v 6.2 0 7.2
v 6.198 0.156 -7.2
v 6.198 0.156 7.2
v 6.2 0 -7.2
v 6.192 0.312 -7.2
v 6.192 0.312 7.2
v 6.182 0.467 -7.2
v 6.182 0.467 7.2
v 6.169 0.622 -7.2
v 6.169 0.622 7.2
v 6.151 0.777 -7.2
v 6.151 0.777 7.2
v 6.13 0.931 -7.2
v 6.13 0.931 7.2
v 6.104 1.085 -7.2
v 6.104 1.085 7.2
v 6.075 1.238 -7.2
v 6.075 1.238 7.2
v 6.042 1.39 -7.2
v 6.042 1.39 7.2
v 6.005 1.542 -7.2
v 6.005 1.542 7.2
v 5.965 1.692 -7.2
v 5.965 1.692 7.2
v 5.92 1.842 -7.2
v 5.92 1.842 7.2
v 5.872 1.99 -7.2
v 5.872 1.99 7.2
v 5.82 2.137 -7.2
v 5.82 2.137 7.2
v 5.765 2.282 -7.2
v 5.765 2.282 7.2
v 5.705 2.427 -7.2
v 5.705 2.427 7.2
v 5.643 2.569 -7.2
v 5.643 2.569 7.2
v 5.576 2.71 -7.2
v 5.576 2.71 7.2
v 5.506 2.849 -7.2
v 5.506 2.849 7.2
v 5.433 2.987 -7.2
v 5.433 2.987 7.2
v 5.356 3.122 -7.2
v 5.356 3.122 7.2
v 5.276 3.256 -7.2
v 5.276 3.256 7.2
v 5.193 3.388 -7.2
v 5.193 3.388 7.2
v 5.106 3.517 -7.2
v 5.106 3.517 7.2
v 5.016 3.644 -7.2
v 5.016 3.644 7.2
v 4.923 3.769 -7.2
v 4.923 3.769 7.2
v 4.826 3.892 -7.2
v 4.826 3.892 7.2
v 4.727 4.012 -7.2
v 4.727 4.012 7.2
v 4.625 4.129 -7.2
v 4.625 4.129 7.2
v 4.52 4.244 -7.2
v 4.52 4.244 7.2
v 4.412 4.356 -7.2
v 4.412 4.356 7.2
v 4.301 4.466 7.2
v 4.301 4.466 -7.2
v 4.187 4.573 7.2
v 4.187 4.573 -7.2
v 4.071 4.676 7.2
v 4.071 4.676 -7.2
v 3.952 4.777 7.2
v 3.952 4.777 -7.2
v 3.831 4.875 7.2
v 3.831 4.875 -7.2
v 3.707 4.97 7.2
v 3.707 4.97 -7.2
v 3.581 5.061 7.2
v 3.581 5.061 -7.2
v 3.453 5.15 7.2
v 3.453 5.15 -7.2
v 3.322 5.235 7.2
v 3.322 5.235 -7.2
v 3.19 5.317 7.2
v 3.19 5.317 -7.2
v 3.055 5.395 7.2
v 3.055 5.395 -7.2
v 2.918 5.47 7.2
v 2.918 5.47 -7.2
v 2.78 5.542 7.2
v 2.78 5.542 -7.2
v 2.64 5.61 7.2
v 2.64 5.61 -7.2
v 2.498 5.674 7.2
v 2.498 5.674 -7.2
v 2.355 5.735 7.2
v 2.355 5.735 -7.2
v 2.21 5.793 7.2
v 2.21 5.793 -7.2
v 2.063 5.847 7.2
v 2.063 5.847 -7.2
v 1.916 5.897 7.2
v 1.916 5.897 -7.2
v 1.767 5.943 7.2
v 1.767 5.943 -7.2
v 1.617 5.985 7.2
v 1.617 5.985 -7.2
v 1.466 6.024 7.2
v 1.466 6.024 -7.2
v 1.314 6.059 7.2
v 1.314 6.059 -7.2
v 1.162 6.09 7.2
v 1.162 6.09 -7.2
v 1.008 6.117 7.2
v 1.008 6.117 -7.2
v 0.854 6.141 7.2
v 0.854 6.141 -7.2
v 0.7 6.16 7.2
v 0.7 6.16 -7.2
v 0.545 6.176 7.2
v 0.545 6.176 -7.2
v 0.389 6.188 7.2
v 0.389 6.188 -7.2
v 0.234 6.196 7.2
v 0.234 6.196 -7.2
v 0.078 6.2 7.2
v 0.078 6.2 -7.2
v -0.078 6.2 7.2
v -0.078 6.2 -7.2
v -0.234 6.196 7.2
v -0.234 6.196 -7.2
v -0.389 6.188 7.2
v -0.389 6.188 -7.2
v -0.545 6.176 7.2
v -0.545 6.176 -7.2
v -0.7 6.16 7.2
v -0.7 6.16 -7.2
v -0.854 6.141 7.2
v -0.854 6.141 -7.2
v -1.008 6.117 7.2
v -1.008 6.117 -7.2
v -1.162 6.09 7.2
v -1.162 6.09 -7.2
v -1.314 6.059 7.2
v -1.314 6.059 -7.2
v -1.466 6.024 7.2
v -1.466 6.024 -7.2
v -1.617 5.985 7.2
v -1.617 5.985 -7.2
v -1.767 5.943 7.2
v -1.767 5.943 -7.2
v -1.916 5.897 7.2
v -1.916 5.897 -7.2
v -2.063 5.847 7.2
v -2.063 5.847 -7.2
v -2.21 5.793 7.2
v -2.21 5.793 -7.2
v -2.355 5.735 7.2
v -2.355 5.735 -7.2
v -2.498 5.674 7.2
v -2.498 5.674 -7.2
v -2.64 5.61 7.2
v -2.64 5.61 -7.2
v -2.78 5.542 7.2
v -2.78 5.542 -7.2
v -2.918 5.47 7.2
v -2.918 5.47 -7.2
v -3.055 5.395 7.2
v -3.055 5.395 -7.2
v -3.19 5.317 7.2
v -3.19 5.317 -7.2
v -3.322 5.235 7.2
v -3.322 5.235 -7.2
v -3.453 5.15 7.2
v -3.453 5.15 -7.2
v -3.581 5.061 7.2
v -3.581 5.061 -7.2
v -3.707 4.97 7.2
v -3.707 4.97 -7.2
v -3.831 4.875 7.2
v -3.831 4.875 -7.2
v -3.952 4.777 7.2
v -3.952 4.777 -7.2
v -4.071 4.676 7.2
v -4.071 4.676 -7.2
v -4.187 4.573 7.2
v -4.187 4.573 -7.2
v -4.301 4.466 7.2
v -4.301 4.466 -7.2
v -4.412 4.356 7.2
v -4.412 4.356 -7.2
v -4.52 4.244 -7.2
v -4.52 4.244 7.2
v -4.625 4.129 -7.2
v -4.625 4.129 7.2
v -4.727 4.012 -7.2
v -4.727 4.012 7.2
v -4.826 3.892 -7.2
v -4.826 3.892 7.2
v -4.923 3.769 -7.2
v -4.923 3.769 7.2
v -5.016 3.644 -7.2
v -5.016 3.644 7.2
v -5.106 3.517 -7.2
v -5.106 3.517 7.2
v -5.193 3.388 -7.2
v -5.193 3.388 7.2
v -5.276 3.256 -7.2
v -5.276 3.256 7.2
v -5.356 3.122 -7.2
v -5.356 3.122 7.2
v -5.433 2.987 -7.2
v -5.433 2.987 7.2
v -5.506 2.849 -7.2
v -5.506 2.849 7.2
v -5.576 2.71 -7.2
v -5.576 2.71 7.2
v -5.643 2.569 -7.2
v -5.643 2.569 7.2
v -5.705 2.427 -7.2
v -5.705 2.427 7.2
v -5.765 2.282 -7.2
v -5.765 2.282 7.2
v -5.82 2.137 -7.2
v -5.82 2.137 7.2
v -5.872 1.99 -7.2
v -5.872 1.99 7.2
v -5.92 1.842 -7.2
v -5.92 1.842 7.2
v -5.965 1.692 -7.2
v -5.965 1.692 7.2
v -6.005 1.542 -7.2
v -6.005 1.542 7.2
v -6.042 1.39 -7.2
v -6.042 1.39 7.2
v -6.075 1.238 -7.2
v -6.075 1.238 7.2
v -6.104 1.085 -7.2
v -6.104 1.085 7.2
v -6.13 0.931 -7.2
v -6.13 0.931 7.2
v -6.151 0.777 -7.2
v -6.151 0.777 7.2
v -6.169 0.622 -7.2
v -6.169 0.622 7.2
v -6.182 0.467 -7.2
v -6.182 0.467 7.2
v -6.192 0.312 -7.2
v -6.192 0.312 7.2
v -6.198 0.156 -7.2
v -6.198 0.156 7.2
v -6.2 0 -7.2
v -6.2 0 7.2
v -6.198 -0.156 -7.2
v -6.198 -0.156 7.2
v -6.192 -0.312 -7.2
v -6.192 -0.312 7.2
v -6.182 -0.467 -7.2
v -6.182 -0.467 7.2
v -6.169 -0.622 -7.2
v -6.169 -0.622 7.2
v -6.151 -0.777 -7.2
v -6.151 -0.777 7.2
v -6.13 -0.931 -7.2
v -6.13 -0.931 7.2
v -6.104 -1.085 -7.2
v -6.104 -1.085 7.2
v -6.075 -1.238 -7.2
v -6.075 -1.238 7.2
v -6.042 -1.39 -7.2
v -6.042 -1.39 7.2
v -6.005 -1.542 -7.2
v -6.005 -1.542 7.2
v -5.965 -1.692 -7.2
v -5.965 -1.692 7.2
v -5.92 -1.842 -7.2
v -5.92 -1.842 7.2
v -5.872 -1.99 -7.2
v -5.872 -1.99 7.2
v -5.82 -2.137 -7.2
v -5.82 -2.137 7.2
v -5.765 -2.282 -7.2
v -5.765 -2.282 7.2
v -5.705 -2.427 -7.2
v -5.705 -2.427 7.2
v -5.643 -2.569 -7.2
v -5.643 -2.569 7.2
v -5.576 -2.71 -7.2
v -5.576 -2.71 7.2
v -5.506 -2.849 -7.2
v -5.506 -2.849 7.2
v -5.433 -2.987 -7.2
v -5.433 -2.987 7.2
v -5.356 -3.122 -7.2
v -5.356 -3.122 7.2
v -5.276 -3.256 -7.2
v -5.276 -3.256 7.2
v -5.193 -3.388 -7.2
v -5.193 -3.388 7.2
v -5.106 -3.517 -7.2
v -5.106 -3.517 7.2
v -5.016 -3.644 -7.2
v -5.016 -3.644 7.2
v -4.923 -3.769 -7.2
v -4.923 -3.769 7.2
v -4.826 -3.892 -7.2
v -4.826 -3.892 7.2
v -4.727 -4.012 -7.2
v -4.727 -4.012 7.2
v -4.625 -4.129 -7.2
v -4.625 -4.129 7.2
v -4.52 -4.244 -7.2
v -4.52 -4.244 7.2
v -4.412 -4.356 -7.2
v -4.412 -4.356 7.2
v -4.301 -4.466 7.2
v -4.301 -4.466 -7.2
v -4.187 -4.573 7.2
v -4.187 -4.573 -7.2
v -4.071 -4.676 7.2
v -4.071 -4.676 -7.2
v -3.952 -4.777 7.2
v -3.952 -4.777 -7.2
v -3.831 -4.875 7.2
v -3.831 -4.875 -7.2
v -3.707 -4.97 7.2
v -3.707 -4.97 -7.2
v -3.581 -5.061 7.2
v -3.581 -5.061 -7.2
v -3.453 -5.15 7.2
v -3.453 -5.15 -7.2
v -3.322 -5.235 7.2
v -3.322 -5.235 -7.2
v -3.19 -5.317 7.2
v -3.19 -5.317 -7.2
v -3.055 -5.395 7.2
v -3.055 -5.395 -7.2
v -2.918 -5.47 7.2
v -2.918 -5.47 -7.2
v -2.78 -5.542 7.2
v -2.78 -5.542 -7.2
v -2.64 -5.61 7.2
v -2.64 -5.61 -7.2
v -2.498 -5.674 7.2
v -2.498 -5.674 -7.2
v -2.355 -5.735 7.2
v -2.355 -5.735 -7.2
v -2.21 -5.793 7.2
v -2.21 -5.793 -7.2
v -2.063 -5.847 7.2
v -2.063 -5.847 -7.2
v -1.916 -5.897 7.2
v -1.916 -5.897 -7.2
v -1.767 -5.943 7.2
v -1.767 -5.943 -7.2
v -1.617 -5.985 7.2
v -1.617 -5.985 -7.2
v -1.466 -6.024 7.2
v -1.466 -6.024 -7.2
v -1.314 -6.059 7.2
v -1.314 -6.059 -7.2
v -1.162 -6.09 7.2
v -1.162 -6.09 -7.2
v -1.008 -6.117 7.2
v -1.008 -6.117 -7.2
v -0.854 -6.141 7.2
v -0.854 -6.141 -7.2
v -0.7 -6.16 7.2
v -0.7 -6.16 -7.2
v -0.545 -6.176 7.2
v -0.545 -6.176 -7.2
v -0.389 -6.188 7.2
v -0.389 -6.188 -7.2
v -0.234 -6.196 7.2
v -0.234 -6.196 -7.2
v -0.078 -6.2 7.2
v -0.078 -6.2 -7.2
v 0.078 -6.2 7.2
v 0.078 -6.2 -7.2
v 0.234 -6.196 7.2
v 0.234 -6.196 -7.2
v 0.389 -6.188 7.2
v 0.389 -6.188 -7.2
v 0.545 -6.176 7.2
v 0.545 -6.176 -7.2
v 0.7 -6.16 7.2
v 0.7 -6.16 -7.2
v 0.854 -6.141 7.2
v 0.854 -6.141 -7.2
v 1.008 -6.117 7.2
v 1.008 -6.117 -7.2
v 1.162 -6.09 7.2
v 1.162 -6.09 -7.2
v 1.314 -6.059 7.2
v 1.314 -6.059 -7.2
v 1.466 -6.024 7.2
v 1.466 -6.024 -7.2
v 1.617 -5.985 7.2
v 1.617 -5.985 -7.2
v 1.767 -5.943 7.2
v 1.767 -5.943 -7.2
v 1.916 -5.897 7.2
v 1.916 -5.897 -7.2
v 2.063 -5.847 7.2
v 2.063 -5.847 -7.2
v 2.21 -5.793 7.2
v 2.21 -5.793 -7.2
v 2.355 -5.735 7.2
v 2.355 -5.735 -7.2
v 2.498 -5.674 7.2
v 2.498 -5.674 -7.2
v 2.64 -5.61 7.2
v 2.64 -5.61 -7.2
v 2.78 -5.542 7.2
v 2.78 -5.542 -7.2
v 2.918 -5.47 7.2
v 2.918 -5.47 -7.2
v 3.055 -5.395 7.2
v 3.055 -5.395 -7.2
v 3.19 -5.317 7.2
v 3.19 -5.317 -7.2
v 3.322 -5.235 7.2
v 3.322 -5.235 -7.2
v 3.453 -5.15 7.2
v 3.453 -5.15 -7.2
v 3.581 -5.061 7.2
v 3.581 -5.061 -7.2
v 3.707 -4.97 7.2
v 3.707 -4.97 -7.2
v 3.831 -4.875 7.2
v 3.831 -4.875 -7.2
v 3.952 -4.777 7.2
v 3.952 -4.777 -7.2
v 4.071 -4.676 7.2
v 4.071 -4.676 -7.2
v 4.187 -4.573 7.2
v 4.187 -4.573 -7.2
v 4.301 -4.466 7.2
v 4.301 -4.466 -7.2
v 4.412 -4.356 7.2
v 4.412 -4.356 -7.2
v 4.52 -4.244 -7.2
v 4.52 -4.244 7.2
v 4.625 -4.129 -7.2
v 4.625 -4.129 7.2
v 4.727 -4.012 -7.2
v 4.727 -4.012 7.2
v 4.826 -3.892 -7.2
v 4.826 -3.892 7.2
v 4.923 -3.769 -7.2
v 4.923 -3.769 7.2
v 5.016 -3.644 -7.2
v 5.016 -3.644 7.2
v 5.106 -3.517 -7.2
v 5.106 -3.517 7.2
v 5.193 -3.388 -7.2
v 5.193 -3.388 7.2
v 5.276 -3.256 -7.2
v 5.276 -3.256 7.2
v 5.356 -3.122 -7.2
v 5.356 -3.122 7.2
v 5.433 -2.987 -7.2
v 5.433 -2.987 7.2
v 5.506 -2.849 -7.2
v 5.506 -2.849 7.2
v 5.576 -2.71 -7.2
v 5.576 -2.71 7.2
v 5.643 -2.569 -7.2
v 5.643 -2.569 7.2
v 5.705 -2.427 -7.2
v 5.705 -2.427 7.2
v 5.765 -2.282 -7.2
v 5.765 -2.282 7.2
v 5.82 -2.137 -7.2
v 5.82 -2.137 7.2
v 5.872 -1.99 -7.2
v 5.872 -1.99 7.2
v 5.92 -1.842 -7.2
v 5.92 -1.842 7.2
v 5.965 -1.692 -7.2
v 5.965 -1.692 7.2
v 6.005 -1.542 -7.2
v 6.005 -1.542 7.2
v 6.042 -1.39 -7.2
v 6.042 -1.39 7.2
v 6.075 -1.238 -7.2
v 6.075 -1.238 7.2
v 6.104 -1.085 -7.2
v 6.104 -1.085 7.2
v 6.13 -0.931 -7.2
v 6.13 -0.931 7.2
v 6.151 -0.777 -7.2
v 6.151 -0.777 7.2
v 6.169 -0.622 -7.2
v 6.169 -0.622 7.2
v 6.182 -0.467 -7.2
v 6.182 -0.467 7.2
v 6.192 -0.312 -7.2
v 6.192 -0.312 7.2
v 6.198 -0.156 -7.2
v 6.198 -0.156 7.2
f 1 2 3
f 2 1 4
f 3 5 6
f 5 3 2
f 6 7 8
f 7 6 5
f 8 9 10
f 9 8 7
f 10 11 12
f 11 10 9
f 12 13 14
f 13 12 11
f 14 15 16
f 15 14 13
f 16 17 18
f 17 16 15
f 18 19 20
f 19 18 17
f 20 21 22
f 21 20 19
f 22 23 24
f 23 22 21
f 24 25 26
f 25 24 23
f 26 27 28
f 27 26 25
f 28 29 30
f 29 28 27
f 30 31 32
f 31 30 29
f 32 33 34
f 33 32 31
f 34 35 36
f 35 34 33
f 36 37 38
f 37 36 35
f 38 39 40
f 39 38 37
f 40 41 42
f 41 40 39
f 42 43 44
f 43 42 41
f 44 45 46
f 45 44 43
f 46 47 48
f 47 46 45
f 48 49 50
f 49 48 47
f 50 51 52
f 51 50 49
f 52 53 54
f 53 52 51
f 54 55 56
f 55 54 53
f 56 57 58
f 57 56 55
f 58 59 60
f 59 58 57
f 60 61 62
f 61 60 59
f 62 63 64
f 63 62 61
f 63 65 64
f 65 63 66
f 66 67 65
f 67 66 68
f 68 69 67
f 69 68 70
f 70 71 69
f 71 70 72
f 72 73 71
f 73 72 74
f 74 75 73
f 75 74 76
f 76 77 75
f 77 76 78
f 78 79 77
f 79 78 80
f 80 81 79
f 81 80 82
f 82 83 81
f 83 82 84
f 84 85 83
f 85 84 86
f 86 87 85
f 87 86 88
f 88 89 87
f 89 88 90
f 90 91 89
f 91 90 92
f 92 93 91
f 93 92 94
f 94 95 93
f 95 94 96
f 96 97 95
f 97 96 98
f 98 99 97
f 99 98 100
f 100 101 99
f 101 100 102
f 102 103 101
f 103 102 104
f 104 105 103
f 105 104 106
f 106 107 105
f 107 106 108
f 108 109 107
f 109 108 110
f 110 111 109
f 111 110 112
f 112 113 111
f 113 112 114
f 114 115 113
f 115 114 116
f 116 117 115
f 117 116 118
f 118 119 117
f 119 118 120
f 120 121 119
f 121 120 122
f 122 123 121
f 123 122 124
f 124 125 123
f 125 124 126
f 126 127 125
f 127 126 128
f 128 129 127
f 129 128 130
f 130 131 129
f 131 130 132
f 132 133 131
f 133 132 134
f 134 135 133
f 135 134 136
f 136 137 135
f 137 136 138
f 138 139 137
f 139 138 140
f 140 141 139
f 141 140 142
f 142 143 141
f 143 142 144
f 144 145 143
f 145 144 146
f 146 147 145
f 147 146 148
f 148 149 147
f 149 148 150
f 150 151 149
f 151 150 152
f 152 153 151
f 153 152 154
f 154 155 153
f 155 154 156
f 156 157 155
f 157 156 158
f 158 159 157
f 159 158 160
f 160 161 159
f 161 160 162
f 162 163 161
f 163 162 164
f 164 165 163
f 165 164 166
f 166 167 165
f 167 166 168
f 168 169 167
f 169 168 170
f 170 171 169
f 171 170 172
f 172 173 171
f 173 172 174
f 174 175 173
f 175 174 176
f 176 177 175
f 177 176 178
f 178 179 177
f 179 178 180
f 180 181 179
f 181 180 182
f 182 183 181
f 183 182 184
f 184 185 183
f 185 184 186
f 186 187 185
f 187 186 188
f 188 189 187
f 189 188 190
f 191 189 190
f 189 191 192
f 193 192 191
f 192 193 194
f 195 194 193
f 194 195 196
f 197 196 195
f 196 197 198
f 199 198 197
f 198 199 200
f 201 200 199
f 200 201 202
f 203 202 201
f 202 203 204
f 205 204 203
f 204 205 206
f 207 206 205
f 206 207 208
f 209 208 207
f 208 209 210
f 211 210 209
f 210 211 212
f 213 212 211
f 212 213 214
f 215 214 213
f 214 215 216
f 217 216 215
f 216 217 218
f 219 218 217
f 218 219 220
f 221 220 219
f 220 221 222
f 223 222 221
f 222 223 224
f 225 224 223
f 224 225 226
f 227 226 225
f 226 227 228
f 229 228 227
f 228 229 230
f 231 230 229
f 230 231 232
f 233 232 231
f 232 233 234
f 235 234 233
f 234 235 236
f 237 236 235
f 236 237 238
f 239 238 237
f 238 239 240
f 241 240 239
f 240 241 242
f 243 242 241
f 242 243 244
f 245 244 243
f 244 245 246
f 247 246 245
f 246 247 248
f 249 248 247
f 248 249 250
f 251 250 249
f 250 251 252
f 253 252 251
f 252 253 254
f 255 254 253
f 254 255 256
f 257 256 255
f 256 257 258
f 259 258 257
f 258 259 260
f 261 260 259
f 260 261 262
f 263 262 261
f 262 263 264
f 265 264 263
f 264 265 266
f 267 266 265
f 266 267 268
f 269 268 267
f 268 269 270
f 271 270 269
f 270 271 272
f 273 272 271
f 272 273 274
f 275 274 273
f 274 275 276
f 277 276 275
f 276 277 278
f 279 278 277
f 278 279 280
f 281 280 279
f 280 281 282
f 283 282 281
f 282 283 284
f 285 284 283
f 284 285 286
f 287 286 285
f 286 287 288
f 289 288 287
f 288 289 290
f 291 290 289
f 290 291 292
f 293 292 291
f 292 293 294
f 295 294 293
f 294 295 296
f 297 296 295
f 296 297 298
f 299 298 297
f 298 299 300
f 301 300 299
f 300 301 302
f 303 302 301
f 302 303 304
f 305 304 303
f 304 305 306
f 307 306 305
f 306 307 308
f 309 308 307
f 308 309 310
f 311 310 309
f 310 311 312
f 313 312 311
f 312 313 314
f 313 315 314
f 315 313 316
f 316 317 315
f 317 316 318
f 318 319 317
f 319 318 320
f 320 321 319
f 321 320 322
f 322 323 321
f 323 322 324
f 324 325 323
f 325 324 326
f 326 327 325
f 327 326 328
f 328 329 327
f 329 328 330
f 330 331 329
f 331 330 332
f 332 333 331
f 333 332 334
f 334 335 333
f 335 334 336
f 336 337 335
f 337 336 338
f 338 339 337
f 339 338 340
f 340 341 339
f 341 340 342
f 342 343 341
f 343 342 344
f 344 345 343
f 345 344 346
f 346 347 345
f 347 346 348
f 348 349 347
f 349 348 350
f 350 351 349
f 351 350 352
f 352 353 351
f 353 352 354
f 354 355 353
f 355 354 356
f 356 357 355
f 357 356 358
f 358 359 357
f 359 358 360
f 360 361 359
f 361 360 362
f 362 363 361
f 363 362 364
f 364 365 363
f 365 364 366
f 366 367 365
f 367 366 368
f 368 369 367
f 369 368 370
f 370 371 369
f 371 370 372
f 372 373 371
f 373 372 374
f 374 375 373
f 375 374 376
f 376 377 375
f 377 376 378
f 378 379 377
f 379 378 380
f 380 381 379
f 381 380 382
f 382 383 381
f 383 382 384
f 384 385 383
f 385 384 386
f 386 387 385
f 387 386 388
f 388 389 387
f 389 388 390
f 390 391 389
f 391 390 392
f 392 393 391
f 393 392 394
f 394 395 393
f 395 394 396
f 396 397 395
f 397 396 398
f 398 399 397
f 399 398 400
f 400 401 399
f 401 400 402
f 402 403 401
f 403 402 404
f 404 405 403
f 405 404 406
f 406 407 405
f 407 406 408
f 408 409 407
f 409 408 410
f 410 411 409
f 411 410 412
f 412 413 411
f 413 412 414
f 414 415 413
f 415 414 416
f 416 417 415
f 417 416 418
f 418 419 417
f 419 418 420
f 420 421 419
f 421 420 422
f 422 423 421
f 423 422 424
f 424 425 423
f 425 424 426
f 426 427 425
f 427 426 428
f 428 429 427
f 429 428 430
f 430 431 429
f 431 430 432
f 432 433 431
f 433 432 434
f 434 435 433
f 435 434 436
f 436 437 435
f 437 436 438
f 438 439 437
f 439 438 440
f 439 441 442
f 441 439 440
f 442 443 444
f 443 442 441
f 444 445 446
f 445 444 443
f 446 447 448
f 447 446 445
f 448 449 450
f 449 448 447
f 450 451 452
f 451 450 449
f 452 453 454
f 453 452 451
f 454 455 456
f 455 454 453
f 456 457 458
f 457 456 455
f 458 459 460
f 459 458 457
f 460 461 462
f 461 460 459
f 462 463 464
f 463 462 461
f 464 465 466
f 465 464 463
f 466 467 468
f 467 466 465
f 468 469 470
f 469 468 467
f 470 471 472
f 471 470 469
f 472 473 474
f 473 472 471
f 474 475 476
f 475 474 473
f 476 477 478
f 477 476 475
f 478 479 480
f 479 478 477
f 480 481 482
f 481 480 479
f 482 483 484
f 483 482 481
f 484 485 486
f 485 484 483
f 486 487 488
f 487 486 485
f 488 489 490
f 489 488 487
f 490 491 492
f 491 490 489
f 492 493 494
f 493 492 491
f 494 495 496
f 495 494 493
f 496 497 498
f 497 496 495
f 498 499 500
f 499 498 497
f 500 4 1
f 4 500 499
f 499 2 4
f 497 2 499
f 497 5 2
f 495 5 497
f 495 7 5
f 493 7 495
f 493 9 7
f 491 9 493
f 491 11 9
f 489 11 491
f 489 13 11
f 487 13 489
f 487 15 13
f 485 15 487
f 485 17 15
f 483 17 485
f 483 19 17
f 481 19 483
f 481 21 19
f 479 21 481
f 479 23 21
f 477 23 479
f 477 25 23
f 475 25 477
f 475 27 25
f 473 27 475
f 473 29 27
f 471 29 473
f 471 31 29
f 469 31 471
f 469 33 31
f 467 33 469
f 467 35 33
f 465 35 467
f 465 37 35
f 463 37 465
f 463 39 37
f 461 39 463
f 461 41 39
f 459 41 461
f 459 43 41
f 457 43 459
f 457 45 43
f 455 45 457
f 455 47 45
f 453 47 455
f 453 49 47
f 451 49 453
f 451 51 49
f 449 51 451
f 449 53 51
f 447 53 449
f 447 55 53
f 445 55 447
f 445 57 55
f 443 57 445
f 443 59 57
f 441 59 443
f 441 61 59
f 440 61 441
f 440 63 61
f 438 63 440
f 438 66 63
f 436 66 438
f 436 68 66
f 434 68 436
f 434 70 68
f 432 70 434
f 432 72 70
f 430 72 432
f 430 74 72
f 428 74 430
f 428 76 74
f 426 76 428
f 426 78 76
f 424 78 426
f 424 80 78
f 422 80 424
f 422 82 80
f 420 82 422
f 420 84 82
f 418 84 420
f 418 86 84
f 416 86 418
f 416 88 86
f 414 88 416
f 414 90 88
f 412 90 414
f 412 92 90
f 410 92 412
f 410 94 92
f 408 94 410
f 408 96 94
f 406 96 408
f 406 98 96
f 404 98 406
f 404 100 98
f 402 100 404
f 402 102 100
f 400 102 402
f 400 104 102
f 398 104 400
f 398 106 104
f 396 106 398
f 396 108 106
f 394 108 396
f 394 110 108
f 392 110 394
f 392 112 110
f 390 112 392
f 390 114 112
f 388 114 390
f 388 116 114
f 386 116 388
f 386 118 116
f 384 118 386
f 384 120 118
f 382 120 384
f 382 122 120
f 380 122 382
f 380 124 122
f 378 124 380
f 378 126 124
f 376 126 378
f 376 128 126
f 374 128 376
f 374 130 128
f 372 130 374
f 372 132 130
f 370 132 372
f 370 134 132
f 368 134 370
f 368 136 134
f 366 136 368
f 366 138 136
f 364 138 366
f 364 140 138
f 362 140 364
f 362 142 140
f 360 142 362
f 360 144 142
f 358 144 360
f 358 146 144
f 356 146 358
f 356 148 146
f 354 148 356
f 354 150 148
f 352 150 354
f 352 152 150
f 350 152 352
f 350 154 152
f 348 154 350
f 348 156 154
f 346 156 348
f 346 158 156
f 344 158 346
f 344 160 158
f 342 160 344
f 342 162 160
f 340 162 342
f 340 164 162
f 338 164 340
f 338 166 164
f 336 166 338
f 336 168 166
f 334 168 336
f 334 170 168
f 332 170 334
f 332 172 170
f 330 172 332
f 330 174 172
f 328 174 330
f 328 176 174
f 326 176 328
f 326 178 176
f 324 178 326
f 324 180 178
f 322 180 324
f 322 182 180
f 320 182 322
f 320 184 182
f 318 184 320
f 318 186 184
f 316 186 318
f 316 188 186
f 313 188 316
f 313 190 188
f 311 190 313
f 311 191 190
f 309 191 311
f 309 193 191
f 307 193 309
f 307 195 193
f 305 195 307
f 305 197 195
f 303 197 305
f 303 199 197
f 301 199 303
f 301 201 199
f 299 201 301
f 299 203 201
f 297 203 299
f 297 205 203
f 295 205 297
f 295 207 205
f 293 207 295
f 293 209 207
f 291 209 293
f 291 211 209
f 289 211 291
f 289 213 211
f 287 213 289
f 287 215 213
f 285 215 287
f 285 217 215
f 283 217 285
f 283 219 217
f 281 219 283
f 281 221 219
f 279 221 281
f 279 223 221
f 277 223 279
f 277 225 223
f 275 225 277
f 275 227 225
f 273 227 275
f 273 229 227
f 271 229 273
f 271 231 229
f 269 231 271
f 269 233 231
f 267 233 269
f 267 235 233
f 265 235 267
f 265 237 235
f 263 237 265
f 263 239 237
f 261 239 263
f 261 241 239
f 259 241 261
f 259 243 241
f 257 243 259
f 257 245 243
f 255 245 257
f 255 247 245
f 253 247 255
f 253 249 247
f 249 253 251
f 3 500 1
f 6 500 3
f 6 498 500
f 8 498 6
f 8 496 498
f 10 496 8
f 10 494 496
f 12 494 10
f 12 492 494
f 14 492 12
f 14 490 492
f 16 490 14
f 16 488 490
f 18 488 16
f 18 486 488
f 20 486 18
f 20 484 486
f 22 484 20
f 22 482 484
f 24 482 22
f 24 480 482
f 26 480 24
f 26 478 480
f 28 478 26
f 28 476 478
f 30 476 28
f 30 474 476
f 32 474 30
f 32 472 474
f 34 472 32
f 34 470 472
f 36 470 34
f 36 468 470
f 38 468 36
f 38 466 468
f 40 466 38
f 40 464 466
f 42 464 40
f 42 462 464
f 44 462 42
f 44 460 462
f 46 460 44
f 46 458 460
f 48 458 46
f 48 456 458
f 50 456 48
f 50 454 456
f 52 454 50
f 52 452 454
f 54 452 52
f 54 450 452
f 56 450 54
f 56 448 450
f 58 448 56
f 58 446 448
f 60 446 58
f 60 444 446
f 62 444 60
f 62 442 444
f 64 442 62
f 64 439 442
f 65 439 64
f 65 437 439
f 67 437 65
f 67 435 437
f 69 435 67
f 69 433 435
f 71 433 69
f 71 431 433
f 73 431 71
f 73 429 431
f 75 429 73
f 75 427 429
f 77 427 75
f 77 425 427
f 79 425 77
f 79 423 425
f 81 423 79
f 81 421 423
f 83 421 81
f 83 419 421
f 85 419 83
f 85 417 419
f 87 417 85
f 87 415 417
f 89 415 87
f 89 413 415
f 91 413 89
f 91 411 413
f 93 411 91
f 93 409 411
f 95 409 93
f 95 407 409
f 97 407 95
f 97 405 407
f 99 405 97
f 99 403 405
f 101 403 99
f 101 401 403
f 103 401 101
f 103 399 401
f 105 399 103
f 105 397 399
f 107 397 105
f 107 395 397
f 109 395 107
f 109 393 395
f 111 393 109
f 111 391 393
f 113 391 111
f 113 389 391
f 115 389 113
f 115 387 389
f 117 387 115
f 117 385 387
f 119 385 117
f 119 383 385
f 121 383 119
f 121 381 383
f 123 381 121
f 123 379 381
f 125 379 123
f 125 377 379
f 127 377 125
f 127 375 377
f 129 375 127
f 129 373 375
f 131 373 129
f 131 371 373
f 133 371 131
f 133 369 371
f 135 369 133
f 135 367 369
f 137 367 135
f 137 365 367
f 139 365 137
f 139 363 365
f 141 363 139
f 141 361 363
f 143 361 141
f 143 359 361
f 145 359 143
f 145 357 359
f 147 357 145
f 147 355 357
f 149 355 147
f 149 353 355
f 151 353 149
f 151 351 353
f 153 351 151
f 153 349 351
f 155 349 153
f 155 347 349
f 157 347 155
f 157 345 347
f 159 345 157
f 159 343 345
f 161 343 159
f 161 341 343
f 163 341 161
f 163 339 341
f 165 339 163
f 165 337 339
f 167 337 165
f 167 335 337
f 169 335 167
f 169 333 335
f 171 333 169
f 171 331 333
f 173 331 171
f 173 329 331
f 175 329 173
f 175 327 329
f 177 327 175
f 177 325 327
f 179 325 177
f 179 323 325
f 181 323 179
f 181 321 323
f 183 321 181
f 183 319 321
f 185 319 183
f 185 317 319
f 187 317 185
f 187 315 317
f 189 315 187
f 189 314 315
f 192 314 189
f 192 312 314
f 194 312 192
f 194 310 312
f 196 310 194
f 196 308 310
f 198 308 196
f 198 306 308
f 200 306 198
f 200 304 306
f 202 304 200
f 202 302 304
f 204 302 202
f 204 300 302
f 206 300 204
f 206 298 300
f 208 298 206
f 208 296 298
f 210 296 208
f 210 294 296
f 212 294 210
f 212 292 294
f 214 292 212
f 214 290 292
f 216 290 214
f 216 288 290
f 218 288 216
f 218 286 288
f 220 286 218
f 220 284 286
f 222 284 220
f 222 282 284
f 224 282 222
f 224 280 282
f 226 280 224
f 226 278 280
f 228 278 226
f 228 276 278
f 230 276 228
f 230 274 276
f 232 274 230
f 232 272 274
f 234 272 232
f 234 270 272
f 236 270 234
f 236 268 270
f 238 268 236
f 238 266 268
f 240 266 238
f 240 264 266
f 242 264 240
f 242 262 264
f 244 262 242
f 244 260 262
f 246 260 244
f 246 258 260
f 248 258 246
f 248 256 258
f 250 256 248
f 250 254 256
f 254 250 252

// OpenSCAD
// file: ../configurations/global.scad
// Display
display_buttons = true;

wood_throw_m3_diameter = 3.3;

// Generics
he14female_z_size = 8.5;
insert_throw_diameter = 4.25;
insert_throw_length = 6;
throw_m3_diameter = 3.5;

mil = 2.54;

// external size
case_external_x_size = 105;
case_external_y_size = 66;
case_external_z_size = 32;
case_external_panes_thickness = 4.8;


housing_facades_throws_diameter = wood_throw_m3_diameter;

facade_front_round_edges_radius = 5;
facade_throws_margin = 5;


// facade corners
facade_fn = 100;

// Button
wood_facade_top_on_off_button_throw_diameter = 12.3;
facade_top_on_off_button_throw_diameter = 12.4;

// USB Connector
usb_connector_diameter = 10.65;
usb_connector_throw_diameter = 10.9;
usb_connector_throw_fn = 250;

motherBoardComponent_breadboard_camera_point_position = [5, 3];
breadboard_z_size = 1.5;


photoButton_position_coords = [19, case_external_y_size, case_external_z_size / 2];
chargerConnector_position_coords = [0, 18, case_external_z_size / 2];

onOffButtonThrowEnveloppe_fn = 250;
boltEnveloppe_fn = 100;

// Housing border
housingBorderPiece_border_thickness = 4;

// Battery
Battery_x_size = 75.8;
Battery_y_size = 21.4;
Battery_z_size = 21.4;

Battery_x_position = case_external_x_size / 2 - Battery_x_size / 2 + 2.5;

// Usb Connector
//usbConnectorThrowEnveloppe_margin = 0.25;
//usbConnectorThrowEnveloppe_length = 20;
//usbConnectorThrowEnveloppe_fn = 100;
// main file
include <../configurations/global.scad>


/**
 * onOffButtonThrowEnveloppe
 * @name onOffButtonThrowEnveloppe
 * @description onOffButtonThrowEnveloppe
 * @type enveloppe
 * @parent root
 */
module onOffButtonThrowEnveloppe(
    z_size = case_external_panes_thickness * 3,
    throw_diameter = facade_top_on_off_button_throw_diameter,
    _fn = onOffButtonThrowEnveloppe_fn
) {
    cylinder(h = z_size, d = throw_diameter, center = true, $fn = _fn);
}

onOffButtonThrowEnveloppe();
